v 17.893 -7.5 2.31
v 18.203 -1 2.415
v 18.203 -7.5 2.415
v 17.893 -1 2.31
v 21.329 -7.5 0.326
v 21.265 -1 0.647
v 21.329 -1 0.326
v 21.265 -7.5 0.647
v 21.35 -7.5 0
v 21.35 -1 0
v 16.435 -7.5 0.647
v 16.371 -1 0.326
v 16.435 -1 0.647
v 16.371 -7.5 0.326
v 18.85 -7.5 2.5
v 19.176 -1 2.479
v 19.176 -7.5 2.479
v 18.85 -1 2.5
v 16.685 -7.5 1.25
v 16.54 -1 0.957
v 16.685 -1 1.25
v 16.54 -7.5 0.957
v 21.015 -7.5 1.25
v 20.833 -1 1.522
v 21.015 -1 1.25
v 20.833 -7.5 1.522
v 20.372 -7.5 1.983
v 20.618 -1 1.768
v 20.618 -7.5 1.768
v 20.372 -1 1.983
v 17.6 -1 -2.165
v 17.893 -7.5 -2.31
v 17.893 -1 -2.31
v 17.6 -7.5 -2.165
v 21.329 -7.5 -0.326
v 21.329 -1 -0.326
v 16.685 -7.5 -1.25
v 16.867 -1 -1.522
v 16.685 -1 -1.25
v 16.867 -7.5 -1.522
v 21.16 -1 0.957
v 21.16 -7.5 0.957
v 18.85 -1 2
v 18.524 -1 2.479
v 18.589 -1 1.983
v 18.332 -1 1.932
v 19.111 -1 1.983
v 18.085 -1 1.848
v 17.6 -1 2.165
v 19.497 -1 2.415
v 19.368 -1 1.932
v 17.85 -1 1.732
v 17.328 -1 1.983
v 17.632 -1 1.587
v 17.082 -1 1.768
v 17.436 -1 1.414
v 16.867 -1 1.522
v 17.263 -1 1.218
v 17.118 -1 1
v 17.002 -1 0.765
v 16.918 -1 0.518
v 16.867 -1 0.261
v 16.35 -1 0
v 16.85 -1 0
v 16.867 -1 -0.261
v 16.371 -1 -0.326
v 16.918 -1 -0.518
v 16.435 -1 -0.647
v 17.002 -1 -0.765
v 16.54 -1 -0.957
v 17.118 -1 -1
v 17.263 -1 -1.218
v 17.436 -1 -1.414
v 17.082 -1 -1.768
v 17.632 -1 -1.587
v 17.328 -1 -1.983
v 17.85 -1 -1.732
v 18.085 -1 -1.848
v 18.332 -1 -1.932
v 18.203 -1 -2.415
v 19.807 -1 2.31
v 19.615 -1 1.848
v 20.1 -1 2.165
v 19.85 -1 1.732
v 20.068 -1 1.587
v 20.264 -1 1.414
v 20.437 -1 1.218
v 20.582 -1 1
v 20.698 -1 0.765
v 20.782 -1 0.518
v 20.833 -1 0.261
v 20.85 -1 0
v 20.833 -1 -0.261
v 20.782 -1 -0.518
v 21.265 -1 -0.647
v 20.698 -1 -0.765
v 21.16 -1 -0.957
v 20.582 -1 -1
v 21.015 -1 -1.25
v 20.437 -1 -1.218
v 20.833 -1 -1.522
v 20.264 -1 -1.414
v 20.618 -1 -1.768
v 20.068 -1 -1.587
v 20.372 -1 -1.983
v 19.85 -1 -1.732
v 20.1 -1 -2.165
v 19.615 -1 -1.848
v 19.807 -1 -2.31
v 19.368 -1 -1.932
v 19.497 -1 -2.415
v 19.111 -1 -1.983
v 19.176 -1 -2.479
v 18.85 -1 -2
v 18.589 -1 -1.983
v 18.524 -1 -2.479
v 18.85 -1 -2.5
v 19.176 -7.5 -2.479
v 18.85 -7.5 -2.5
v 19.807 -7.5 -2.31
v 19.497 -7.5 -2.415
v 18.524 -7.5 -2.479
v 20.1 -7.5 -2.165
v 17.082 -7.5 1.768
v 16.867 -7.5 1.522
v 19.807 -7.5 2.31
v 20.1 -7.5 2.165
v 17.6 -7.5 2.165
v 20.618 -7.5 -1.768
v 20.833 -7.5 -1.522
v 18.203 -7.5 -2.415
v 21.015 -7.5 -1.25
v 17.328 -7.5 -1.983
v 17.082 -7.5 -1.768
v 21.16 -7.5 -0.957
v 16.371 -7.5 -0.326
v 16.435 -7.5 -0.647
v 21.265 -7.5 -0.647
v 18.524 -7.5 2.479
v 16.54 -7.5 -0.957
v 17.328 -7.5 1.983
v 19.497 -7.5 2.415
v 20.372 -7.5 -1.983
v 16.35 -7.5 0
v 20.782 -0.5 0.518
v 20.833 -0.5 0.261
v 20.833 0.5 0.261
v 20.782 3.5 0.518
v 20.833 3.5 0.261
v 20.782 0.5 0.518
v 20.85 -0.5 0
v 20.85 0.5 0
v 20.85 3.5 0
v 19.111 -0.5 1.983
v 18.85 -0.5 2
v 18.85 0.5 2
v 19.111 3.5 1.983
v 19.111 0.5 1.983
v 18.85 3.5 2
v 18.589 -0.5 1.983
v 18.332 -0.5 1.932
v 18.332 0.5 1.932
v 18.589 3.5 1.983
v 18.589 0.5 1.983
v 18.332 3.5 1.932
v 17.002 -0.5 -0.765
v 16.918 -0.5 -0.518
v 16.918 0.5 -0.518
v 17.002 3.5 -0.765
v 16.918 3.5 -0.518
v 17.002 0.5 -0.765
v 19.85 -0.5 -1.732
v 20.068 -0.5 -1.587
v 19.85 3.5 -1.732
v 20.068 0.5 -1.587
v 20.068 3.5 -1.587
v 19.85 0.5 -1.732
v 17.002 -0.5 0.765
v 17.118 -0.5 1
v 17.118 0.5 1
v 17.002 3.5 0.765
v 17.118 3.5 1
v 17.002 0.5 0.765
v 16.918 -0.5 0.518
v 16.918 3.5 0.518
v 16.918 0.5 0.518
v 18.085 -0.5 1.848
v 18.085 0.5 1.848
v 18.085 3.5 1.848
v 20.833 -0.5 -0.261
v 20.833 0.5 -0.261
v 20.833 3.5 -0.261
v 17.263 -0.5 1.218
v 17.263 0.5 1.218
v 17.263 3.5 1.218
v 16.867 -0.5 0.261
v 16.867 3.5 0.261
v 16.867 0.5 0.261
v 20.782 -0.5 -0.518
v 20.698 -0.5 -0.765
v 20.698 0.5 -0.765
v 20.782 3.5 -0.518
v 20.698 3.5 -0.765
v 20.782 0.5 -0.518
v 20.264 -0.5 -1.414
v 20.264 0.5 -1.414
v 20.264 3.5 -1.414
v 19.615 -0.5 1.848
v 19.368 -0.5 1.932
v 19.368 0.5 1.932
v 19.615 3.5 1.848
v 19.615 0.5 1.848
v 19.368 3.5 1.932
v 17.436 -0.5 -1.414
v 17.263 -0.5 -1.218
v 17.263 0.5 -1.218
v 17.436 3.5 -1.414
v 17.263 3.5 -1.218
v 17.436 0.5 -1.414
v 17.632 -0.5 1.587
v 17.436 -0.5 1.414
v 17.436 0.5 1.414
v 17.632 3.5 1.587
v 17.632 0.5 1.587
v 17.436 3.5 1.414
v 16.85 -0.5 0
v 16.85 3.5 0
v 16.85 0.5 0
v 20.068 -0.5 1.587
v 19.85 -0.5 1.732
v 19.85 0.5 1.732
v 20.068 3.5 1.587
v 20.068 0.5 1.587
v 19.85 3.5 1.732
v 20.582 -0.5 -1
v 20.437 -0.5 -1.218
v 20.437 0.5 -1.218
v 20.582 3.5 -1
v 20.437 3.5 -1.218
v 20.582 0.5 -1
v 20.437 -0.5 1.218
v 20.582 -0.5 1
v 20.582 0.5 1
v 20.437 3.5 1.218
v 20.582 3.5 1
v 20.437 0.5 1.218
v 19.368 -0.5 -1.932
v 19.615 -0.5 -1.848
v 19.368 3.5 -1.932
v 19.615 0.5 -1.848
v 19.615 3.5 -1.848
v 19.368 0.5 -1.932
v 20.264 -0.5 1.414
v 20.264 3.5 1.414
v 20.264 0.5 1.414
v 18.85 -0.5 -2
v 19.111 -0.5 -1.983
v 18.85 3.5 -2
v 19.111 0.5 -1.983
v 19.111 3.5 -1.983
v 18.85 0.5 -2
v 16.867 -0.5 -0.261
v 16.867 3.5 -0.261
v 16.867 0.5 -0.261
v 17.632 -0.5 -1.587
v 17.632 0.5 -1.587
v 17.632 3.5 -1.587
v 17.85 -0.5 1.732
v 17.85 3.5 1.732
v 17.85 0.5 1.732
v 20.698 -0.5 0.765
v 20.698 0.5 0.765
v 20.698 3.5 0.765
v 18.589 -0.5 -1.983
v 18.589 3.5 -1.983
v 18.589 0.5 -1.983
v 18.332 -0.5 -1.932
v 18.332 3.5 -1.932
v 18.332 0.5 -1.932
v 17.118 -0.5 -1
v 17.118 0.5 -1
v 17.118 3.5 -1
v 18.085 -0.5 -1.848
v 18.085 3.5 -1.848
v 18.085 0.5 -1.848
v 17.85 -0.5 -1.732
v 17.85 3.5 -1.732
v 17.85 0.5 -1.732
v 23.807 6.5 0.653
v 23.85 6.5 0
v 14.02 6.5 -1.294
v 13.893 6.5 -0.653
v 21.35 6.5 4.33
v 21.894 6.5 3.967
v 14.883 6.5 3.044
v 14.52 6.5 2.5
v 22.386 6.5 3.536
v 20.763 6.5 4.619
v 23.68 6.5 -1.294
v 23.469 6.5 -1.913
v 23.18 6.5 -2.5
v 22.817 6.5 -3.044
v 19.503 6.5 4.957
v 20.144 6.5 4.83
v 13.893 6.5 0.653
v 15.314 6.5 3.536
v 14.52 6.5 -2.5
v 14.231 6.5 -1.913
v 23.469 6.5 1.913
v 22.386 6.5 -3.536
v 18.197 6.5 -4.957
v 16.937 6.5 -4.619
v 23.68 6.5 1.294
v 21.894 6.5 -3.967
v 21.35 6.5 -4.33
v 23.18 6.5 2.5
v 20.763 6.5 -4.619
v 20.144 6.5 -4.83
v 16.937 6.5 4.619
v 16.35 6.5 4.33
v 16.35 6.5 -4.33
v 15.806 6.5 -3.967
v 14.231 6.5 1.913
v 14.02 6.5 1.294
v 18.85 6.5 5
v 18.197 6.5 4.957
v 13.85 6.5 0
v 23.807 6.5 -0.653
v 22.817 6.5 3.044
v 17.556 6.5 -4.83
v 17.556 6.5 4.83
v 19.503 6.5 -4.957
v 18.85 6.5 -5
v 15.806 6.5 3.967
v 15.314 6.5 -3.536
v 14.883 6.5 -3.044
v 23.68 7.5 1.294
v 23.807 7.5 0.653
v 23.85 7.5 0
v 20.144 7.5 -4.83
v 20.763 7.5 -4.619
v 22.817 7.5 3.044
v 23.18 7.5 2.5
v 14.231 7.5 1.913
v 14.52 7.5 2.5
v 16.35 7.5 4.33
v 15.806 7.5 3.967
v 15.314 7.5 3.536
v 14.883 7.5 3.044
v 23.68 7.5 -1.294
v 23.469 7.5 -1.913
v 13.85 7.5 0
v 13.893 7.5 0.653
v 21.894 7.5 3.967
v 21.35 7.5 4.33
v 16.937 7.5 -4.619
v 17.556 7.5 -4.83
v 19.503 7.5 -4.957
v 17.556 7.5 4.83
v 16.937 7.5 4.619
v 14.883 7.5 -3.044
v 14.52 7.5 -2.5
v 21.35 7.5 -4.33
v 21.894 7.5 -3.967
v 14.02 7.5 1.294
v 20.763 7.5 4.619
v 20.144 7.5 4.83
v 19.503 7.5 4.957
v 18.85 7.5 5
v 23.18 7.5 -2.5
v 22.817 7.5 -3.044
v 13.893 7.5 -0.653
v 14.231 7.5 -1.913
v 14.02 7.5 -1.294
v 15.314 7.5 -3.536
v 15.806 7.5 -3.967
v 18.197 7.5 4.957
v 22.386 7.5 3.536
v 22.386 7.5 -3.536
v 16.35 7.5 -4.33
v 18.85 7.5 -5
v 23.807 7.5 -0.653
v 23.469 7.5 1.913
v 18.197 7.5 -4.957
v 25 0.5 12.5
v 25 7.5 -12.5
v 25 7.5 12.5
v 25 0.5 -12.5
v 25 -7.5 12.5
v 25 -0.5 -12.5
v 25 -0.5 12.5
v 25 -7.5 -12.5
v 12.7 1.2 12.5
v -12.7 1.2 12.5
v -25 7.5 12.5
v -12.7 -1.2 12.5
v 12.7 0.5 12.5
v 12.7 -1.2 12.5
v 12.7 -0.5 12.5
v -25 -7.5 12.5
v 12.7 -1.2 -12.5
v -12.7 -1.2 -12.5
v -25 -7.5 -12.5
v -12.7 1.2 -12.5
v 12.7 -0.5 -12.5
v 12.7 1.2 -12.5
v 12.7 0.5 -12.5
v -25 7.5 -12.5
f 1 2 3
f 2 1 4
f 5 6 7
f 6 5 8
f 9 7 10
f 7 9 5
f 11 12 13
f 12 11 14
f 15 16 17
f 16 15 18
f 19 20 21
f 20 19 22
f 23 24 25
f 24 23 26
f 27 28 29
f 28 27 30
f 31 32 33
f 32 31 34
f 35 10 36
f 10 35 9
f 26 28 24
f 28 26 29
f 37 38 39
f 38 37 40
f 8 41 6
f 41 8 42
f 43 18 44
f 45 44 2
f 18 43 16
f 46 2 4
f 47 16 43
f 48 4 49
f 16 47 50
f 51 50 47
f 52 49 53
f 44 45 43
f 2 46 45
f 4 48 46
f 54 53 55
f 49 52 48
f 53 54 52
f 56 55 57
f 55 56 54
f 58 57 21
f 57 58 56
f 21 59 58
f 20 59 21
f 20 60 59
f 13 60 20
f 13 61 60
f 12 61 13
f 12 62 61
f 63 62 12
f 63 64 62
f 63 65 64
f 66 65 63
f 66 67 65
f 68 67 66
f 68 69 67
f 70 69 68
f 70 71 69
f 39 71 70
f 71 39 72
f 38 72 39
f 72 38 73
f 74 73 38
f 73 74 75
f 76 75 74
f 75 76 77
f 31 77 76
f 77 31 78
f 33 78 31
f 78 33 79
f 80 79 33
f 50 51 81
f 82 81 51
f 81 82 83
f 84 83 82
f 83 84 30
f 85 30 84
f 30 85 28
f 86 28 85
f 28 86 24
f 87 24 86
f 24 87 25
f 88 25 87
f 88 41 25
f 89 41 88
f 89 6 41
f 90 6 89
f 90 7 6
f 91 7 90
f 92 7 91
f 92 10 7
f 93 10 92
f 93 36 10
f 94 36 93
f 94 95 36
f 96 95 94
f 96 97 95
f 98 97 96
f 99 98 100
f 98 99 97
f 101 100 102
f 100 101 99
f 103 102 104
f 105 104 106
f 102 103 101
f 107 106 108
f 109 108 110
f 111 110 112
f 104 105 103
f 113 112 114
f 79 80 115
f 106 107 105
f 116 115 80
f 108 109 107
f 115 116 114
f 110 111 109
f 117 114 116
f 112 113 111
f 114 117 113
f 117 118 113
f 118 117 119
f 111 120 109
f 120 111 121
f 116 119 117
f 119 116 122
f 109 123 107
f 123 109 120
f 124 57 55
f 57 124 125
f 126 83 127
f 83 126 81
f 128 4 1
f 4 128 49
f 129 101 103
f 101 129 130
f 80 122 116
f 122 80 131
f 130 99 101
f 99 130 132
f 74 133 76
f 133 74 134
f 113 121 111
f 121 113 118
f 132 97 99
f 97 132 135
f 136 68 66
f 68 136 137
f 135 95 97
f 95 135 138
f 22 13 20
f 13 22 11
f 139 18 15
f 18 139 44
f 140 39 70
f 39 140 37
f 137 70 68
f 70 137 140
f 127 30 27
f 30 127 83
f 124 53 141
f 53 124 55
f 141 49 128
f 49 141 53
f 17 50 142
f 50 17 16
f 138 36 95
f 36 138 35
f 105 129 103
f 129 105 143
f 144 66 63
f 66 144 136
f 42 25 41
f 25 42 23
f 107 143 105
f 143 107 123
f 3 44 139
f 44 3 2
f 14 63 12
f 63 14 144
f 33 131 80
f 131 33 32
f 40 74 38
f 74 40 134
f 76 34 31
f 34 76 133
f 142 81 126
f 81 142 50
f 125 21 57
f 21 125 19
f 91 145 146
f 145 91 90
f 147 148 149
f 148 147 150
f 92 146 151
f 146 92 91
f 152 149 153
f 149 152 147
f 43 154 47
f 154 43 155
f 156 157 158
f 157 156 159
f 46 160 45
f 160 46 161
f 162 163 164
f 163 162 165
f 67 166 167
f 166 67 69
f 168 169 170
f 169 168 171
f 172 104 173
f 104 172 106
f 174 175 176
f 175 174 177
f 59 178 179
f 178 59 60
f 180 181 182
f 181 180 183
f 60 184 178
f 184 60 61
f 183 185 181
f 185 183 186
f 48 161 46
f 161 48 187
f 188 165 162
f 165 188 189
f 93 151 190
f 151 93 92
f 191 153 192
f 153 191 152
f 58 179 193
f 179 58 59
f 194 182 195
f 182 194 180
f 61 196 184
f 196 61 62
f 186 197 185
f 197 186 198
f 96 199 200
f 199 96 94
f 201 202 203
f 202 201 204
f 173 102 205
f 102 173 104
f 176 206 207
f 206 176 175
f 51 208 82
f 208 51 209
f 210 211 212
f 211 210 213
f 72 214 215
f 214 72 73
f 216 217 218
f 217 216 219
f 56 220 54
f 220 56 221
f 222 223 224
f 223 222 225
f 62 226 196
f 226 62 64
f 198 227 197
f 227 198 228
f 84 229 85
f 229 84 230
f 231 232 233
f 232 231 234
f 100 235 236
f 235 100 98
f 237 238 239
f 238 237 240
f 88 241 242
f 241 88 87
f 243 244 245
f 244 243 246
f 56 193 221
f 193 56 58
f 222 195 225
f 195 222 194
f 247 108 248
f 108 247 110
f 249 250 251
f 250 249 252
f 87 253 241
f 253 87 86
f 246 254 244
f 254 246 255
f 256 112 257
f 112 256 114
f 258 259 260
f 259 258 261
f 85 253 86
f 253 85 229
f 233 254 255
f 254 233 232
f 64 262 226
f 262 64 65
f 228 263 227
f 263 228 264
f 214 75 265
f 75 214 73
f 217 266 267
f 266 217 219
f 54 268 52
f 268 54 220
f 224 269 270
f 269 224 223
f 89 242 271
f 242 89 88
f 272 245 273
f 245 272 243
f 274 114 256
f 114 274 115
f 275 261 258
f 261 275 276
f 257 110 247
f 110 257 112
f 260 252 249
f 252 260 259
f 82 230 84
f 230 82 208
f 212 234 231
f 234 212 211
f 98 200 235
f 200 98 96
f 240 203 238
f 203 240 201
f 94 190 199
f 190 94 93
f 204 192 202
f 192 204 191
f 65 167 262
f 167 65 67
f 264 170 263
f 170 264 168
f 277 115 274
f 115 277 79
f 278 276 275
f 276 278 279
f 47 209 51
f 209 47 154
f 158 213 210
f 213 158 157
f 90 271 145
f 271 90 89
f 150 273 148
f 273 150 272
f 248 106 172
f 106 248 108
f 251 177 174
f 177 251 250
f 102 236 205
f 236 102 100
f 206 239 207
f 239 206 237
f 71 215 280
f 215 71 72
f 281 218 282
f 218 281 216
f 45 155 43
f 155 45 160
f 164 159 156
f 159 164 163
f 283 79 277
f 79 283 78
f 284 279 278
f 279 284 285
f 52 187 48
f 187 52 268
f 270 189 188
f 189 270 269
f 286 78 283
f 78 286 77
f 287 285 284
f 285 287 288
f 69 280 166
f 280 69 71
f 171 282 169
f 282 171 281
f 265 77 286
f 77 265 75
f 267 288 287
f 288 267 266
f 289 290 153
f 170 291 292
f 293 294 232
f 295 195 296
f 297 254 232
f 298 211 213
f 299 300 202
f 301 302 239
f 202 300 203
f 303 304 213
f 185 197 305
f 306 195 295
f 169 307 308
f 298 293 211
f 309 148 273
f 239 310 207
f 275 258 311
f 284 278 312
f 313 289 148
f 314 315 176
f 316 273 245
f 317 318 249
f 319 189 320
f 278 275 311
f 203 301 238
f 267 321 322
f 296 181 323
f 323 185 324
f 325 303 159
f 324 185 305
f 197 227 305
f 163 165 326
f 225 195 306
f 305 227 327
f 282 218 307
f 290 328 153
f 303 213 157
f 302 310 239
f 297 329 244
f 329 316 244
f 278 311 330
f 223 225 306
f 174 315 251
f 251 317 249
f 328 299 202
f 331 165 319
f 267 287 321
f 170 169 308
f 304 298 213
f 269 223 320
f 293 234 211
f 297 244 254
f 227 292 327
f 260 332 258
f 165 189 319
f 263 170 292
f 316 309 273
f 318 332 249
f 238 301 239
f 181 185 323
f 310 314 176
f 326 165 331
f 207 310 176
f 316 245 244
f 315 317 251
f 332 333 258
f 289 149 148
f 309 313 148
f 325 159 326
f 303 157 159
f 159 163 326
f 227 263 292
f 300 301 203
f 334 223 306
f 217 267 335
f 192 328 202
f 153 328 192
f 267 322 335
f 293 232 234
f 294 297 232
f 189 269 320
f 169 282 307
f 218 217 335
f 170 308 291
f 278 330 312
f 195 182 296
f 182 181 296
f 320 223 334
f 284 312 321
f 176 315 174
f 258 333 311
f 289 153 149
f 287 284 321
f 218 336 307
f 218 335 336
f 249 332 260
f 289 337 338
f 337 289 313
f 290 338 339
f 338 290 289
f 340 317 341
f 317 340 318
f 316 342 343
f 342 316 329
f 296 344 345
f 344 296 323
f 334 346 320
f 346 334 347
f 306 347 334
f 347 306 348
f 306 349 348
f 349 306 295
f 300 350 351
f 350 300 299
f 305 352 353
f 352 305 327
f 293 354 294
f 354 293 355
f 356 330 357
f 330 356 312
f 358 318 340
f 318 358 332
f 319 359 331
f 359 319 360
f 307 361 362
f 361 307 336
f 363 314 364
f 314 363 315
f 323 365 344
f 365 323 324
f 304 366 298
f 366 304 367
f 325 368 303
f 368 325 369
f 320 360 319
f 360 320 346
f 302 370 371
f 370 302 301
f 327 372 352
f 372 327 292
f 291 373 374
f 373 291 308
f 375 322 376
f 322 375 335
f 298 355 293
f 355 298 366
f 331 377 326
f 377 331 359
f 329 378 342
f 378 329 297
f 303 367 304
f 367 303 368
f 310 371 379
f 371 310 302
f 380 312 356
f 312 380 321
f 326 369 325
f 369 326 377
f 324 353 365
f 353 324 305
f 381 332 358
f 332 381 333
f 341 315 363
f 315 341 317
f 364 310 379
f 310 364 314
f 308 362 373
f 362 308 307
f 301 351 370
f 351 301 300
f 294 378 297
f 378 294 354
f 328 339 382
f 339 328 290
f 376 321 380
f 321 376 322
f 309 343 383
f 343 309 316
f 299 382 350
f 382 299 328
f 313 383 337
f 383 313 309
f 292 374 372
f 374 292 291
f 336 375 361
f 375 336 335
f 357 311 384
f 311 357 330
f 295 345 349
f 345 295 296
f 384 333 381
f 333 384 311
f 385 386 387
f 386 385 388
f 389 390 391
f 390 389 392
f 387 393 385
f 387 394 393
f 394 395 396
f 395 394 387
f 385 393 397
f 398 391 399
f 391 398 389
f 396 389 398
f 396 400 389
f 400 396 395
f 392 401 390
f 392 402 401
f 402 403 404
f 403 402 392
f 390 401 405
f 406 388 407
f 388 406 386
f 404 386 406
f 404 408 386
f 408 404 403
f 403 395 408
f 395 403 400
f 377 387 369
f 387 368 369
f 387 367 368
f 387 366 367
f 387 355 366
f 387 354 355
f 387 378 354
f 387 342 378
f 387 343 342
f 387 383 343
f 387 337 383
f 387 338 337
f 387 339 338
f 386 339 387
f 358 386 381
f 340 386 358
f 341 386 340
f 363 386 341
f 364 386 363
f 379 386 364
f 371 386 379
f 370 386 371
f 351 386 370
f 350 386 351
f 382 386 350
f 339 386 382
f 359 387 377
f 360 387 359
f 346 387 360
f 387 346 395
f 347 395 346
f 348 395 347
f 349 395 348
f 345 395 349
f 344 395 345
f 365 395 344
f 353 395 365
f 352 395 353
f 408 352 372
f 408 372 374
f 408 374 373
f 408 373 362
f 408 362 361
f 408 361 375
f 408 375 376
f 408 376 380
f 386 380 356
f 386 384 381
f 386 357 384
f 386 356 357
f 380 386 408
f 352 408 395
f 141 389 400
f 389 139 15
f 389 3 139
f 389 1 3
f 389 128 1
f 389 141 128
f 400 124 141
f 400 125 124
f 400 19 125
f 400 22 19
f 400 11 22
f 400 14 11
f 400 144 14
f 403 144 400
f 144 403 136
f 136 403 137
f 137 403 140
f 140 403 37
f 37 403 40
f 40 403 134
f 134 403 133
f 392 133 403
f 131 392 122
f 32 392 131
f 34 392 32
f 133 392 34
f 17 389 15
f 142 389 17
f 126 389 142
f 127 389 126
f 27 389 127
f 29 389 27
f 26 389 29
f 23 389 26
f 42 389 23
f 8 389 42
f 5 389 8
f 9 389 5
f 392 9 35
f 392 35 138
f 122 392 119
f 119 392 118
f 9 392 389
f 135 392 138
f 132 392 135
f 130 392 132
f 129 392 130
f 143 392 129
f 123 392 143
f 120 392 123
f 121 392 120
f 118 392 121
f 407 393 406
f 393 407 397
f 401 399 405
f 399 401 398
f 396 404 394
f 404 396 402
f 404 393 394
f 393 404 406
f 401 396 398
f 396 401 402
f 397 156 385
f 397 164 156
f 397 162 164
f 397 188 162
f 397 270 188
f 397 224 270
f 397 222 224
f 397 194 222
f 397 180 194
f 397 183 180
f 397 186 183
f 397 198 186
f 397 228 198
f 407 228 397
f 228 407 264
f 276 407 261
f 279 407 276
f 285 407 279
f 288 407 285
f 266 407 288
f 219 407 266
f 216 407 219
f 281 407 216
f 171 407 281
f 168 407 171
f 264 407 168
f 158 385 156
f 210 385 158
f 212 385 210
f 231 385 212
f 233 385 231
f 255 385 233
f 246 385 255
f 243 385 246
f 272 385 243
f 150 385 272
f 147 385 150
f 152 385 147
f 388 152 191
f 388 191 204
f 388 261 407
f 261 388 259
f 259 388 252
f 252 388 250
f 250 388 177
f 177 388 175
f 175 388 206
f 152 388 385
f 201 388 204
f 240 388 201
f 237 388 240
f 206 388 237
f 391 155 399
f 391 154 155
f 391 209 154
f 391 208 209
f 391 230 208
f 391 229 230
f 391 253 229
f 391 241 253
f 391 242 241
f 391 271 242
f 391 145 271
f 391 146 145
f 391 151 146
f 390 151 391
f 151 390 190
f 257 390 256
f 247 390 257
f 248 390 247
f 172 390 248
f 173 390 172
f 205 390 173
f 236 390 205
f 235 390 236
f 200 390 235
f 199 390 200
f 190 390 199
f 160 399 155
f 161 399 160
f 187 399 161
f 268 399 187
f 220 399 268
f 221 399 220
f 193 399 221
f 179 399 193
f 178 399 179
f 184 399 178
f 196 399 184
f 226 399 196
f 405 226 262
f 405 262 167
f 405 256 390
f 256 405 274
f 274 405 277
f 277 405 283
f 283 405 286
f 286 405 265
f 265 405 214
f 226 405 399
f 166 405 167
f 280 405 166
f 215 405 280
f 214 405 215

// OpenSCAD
/* [Overall Size] */
thickness = 15; // [10:30]
width = 50;  // [45:90]
depth = 25;  // [15:50]

/* [Ruler Size] */
ruler_width = 25.4; // [10:40]
ruler_thickness = 2.4; // [1:5]

/* [bolt_size]*/
bolt_dia = 4;  // [3:6]
bolt_head = 10; // [8:12]

/* [Hidden] */
$fn=48;


difference() {
    br = bolt_dia /2;
    hr = bolt_head /2;
    t = .5; // thread allowance
    
    //overall dimensions
    cube([width, thickness, depth], center = true);
    
    //slot for ruler
    cube([ruler_width, ruler_thickness, depth+.1], center = true);
    
    //1mm slot to clamp with
    translate([width/4,0,0]) 
        cube([width/2+.1,1,depth+.1], center = true);

    //screw shank and head
    translate([(ruler_width+width)/4,-1,0]) rotate([90,0,0]){
        cylinder(10, br+t, br+t);
        translate([0,0,-thickness/2]) cylinder(thickness/2, br, br);
        translate([0,0,-thickness/2]) cylinder(3, hr, br);
        translate([0,0,-3-thickness/2]) cylinder(3, hr, hr);
    }
}
